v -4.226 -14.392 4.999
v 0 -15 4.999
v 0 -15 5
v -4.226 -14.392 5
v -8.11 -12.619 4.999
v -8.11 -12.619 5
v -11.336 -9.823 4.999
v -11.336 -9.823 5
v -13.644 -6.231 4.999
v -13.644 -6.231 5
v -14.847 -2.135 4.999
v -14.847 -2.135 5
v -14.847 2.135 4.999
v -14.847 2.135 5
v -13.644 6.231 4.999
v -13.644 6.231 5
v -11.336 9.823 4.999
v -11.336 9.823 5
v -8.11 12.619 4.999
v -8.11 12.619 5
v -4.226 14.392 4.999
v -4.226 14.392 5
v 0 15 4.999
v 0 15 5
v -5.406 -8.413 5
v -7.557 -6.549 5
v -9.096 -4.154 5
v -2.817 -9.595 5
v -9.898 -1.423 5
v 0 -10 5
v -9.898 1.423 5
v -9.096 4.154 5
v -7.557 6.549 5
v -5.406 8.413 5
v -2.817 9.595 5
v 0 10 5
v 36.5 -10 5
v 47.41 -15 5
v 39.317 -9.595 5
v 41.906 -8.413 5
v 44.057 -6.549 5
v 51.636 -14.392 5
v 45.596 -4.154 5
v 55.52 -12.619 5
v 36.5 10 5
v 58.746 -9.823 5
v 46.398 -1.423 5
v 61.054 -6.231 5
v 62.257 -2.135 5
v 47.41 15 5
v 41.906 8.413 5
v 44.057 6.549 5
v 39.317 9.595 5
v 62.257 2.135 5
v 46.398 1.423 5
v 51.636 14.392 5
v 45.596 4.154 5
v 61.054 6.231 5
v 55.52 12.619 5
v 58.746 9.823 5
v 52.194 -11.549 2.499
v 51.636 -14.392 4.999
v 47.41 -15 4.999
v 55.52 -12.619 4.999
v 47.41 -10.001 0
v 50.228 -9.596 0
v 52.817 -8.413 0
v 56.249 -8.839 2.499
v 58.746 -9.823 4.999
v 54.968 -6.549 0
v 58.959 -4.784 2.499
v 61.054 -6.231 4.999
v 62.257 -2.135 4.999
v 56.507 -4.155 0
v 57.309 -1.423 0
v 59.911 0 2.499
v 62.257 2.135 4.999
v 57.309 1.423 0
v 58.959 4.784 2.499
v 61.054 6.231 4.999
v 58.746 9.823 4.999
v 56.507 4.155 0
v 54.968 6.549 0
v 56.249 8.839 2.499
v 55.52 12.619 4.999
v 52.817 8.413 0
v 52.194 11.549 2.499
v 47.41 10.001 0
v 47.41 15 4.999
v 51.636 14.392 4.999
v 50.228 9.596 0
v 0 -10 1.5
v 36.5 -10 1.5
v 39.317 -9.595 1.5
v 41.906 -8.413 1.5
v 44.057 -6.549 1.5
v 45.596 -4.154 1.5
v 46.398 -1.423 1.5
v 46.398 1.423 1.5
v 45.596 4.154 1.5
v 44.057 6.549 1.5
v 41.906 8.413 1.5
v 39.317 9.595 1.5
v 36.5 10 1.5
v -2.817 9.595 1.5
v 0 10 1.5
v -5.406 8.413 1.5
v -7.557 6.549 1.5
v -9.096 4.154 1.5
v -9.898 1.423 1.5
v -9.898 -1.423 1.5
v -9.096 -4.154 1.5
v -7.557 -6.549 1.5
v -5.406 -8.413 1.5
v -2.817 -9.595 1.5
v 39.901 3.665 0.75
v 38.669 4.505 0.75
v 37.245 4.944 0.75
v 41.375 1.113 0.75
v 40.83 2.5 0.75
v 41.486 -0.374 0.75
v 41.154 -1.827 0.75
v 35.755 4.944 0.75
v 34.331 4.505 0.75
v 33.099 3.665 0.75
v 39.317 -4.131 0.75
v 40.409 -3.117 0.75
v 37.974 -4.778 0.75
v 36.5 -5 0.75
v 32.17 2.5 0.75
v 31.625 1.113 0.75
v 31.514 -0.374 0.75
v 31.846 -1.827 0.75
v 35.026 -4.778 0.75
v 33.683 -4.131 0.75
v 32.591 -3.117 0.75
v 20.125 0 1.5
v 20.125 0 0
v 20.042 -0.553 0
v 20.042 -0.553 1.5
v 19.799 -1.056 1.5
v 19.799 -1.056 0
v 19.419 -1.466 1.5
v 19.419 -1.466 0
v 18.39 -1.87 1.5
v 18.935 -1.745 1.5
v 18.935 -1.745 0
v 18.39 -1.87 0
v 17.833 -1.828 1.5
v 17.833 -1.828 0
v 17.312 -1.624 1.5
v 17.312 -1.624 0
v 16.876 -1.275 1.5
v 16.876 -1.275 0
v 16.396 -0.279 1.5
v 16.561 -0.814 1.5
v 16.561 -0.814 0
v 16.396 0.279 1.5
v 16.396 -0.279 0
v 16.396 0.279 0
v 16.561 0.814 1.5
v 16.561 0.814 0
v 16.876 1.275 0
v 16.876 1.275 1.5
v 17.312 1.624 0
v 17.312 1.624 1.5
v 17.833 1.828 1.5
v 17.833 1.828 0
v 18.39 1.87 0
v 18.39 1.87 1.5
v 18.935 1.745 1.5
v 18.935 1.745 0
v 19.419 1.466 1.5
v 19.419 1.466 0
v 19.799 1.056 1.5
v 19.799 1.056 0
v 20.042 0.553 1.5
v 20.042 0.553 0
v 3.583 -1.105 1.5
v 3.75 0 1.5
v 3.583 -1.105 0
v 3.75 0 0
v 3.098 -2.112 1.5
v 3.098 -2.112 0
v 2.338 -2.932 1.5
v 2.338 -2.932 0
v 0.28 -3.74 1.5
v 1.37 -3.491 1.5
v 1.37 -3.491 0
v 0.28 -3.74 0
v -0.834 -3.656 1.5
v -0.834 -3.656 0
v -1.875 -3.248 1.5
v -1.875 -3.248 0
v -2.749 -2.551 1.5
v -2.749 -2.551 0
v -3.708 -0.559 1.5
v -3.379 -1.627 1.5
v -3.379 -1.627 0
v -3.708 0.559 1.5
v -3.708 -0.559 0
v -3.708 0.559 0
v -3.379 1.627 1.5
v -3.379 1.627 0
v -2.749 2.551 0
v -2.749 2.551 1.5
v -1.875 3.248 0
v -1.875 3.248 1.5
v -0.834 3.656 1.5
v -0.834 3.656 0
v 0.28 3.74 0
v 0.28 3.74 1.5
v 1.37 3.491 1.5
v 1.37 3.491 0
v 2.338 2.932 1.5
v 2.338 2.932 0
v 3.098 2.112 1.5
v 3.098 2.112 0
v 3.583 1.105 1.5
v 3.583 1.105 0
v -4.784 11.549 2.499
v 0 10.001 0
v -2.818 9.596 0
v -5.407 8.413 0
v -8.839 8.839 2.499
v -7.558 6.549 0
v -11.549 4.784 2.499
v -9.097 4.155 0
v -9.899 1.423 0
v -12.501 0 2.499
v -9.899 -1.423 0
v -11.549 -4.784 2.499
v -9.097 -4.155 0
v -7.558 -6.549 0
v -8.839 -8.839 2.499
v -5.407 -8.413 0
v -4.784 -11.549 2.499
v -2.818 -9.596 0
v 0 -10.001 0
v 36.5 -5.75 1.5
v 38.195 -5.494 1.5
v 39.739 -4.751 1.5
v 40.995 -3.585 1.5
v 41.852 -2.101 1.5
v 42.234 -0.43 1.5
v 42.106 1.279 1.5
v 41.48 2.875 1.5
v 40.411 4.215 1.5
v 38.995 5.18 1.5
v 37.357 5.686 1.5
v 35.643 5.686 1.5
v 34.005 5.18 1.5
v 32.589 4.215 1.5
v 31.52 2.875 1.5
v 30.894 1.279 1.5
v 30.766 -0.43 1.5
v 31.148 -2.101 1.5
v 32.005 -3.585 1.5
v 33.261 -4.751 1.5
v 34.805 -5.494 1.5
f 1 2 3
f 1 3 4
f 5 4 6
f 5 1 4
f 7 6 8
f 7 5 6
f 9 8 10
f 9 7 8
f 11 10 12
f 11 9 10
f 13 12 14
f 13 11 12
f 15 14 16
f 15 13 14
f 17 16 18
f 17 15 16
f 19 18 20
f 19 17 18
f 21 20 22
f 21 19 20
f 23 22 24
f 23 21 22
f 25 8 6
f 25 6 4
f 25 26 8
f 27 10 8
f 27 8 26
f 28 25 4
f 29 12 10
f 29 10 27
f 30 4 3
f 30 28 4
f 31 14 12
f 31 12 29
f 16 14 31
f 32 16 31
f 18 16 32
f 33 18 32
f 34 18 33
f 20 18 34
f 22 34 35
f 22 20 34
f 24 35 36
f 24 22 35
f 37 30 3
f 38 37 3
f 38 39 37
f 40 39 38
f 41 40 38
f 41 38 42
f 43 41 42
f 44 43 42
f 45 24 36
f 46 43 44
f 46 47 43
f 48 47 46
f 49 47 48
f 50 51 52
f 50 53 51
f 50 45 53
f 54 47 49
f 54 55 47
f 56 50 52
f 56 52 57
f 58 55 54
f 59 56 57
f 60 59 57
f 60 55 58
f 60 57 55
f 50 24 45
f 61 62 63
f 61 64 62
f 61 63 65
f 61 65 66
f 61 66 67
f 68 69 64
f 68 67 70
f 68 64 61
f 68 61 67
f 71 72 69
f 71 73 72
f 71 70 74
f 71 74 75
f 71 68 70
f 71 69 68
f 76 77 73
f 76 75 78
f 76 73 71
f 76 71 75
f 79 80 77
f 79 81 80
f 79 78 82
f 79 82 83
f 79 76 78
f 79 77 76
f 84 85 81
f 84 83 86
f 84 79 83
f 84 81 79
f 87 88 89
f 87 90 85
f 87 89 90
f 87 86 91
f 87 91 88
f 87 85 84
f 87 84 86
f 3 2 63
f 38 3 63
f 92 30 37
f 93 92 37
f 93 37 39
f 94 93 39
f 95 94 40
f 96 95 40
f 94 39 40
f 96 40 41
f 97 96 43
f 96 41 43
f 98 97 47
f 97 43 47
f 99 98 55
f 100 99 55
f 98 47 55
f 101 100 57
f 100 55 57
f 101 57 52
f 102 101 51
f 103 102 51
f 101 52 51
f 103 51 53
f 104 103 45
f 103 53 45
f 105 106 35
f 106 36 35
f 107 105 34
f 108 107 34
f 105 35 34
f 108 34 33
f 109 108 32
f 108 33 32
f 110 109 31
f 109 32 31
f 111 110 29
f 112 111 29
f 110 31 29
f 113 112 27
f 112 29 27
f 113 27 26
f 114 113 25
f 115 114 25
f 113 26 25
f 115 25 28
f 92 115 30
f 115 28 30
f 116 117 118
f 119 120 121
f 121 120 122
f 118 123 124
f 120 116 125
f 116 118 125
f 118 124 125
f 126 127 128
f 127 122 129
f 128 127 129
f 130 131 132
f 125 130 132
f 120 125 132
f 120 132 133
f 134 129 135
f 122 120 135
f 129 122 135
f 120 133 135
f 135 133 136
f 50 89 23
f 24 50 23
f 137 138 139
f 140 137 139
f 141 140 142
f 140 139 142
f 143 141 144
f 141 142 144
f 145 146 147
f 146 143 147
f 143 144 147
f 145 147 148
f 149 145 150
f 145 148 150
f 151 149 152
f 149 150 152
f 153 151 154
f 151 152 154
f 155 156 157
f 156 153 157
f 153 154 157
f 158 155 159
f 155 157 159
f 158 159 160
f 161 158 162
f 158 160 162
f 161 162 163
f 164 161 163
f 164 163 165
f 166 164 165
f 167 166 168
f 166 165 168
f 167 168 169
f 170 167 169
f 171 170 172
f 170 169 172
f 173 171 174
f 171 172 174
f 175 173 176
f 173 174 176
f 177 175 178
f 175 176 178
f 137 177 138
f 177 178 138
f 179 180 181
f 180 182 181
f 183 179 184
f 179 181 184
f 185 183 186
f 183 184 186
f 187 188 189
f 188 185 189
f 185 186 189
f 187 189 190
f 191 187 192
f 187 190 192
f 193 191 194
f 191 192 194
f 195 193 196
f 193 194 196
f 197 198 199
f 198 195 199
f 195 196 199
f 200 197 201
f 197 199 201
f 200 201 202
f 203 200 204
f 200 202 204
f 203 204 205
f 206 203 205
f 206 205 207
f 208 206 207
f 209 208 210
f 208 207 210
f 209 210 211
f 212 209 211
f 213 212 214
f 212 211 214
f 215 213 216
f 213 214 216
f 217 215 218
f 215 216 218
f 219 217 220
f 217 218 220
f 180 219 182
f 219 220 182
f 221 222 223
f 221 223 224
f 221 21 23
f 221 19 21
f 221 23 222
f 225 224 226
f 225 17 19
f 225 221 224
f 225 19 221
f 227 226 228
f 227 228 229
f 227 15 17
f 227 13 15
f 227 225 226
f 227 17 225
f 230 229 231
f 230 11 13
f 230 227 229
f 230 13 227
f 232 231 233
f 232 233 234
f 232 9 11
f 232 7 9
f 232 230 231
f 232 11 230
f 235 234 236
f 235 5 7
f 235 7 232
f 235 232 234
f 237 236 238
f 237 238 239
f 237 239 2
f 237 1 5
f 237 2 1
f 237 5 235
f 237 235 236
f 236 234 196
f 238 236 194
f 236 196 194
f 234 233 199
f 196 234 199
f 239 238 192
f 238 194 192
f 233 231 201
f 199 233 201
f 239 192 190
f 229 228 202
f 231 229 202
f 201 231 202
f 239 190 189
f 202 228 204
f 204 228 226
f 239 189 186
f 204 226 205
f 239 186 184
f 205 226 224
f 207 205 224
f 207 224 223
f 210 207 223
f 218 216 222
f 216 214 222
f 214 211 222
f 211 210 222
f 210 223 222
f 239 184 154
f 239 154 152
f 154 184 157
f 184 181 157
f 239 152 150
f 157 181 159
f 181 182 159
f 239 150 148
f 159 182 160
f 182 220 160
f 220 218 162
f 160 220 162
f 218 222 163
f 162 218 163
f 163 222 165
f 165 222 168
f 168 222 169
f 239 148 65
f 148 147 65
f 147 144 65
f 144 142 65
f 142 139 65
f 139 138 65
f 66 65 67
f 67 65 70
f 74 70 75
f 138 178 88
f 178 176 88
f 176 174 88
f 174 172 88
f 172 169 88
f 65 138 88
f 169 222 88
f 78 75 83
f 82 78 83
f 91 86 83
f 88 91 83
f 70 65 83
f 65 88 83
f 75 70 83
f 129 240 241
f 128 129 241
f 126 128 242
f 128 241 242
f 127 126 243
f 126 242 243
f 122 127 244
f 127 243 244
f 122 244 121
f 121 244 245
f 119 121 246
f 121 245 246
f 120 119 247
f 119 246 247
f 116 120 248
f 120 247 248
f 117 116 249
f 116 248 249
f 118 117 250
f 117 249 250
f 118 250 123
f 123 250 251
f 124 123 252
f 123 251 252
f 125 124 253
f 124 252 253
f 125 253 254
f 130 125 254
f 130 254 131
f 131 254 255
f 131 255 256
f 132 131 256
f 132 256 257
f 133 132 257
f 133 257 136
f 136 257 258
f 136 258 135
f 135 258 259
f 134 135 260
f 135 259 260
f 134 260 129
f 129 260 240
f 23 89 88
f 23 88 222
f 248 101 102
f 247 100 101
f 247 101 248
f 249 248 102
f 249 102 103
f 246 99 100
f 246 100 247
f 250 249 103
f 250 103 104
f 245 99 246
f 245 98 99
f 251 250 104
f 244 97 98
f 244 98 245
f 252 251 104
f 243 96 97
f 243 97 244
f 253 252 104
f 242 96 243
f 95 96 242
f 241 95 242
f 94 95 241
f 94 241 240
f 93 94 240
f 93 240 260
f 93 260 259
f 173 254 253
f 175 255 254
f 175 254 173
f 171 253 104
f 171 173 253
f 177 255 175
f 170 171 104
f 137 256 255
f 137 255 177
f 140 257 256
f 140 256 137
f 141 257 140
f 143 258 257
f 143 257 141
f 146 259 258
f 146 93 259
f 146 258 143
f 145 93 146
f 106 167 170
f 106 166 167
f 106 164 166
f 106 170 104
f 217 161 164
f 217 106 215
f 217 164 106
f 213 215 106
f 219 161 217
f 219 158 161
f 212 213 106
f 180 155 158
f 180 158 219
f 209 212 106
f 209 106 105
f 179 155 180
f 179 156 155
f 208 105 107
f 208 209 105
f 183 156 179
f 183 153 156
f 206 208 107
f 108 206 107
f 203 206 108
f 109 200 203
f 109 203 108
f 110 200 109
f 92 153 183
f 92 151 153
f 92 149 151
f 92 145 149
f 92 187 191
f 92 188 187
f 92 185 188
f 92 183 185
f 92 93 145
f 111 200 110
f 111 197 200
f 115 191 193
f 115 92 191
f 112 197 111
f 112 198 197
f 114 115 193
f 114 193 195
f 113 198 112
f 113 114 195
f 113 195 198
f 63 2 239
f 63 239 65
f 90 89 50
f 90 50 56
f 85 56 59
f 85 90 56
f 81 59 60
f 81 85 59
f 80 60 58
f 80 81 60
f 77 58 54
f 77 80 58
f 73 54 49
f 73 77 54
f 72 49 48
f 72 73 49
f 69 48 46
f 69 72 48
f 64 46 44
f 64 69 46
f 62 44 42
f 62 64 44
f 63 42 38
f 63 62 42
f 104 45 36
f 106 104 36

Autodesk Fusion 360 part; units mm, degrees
sketch "Esboço1" plane through (0, 0, 0) normal (0, 0, 1) x (1, 0, 0)
  line L0 (0, -15) -> (47.41, -15)
  arc A0 (47.41, -15) -> (47.41, 15) centre (47.41, 0) ccw
  line L1 (47.41, 15) -> (0, 15)
  arc A1 (0, 15) -> (0, -15) centre (0, 0) ccw
  line L2 (0, 0) -> (47.41, 0) construction
  line L3 (-15, 0) -> (62.41, 0) construction
  circle A2 centre (0, 0) radius 3.75
  circle A3 centre (18.25, 0) radius 1.875
  dimension "d1" = 15
  dimension "d4" = 77.41
  dimension "d5" = 7.5
  dimension "d6" = 18.25
  dimension "d7" = 3.75
extrude "Extrusão1" add sketch "Esboço1" along normal blind 5
sketch "Esboço2" plane through (0, 0, 5) normal (0, 0, 1) x (-1, 0, 0)
  circle A0 centre (-18.25, 0) radius 1.875
  circle A1 centre (0, 0) radius 3.75
  arc A2 (0, -15) -> (0, 15) centre (0, 0) ccw
  line L0 (0, 15) -> (-47.41, 15)
  arc A3 (-47.41, 15) -> (-47.41, -15) centre (-47.41, 0) ccw
  line L1 (-47.41, -15) -> (0, -15)
  line L2 (0, 10) -> (-36.5, 10)
  arc A4 (-36.5, 10) -> (-36.5, -10) centre (-36.5, 0) ccw
  line L3 (-36.5, -10) -> (0, -10)
  arc A5 (0, -10) -> (0, 10) centre (0, 0) ccw
  line L4 (0, 0) -> (-36.5, 0) construction
  dimension "d10" = 36.5
  dimension "d11" = 10
extrude "Extrusão2" cut sketch "Esboço2" against normal blind 3.5 contours L2 A4 L3 A5
hole "Furo1" at (36.5, 0, 1.5) direction (0, 0, -1) diameter 10 depth 0.75 tip angle 180
chamfer "Chanfro1" distance 0.75 angle 45 1 edges at (31.8384, 1.8081, 1.5)
chamfer "Chanfro2" distance 5 angle 45 4 edges at (23.705, 15, 0) (-15, 0, 0) (23.705, -15, 0) (62.41, 0, 0)
